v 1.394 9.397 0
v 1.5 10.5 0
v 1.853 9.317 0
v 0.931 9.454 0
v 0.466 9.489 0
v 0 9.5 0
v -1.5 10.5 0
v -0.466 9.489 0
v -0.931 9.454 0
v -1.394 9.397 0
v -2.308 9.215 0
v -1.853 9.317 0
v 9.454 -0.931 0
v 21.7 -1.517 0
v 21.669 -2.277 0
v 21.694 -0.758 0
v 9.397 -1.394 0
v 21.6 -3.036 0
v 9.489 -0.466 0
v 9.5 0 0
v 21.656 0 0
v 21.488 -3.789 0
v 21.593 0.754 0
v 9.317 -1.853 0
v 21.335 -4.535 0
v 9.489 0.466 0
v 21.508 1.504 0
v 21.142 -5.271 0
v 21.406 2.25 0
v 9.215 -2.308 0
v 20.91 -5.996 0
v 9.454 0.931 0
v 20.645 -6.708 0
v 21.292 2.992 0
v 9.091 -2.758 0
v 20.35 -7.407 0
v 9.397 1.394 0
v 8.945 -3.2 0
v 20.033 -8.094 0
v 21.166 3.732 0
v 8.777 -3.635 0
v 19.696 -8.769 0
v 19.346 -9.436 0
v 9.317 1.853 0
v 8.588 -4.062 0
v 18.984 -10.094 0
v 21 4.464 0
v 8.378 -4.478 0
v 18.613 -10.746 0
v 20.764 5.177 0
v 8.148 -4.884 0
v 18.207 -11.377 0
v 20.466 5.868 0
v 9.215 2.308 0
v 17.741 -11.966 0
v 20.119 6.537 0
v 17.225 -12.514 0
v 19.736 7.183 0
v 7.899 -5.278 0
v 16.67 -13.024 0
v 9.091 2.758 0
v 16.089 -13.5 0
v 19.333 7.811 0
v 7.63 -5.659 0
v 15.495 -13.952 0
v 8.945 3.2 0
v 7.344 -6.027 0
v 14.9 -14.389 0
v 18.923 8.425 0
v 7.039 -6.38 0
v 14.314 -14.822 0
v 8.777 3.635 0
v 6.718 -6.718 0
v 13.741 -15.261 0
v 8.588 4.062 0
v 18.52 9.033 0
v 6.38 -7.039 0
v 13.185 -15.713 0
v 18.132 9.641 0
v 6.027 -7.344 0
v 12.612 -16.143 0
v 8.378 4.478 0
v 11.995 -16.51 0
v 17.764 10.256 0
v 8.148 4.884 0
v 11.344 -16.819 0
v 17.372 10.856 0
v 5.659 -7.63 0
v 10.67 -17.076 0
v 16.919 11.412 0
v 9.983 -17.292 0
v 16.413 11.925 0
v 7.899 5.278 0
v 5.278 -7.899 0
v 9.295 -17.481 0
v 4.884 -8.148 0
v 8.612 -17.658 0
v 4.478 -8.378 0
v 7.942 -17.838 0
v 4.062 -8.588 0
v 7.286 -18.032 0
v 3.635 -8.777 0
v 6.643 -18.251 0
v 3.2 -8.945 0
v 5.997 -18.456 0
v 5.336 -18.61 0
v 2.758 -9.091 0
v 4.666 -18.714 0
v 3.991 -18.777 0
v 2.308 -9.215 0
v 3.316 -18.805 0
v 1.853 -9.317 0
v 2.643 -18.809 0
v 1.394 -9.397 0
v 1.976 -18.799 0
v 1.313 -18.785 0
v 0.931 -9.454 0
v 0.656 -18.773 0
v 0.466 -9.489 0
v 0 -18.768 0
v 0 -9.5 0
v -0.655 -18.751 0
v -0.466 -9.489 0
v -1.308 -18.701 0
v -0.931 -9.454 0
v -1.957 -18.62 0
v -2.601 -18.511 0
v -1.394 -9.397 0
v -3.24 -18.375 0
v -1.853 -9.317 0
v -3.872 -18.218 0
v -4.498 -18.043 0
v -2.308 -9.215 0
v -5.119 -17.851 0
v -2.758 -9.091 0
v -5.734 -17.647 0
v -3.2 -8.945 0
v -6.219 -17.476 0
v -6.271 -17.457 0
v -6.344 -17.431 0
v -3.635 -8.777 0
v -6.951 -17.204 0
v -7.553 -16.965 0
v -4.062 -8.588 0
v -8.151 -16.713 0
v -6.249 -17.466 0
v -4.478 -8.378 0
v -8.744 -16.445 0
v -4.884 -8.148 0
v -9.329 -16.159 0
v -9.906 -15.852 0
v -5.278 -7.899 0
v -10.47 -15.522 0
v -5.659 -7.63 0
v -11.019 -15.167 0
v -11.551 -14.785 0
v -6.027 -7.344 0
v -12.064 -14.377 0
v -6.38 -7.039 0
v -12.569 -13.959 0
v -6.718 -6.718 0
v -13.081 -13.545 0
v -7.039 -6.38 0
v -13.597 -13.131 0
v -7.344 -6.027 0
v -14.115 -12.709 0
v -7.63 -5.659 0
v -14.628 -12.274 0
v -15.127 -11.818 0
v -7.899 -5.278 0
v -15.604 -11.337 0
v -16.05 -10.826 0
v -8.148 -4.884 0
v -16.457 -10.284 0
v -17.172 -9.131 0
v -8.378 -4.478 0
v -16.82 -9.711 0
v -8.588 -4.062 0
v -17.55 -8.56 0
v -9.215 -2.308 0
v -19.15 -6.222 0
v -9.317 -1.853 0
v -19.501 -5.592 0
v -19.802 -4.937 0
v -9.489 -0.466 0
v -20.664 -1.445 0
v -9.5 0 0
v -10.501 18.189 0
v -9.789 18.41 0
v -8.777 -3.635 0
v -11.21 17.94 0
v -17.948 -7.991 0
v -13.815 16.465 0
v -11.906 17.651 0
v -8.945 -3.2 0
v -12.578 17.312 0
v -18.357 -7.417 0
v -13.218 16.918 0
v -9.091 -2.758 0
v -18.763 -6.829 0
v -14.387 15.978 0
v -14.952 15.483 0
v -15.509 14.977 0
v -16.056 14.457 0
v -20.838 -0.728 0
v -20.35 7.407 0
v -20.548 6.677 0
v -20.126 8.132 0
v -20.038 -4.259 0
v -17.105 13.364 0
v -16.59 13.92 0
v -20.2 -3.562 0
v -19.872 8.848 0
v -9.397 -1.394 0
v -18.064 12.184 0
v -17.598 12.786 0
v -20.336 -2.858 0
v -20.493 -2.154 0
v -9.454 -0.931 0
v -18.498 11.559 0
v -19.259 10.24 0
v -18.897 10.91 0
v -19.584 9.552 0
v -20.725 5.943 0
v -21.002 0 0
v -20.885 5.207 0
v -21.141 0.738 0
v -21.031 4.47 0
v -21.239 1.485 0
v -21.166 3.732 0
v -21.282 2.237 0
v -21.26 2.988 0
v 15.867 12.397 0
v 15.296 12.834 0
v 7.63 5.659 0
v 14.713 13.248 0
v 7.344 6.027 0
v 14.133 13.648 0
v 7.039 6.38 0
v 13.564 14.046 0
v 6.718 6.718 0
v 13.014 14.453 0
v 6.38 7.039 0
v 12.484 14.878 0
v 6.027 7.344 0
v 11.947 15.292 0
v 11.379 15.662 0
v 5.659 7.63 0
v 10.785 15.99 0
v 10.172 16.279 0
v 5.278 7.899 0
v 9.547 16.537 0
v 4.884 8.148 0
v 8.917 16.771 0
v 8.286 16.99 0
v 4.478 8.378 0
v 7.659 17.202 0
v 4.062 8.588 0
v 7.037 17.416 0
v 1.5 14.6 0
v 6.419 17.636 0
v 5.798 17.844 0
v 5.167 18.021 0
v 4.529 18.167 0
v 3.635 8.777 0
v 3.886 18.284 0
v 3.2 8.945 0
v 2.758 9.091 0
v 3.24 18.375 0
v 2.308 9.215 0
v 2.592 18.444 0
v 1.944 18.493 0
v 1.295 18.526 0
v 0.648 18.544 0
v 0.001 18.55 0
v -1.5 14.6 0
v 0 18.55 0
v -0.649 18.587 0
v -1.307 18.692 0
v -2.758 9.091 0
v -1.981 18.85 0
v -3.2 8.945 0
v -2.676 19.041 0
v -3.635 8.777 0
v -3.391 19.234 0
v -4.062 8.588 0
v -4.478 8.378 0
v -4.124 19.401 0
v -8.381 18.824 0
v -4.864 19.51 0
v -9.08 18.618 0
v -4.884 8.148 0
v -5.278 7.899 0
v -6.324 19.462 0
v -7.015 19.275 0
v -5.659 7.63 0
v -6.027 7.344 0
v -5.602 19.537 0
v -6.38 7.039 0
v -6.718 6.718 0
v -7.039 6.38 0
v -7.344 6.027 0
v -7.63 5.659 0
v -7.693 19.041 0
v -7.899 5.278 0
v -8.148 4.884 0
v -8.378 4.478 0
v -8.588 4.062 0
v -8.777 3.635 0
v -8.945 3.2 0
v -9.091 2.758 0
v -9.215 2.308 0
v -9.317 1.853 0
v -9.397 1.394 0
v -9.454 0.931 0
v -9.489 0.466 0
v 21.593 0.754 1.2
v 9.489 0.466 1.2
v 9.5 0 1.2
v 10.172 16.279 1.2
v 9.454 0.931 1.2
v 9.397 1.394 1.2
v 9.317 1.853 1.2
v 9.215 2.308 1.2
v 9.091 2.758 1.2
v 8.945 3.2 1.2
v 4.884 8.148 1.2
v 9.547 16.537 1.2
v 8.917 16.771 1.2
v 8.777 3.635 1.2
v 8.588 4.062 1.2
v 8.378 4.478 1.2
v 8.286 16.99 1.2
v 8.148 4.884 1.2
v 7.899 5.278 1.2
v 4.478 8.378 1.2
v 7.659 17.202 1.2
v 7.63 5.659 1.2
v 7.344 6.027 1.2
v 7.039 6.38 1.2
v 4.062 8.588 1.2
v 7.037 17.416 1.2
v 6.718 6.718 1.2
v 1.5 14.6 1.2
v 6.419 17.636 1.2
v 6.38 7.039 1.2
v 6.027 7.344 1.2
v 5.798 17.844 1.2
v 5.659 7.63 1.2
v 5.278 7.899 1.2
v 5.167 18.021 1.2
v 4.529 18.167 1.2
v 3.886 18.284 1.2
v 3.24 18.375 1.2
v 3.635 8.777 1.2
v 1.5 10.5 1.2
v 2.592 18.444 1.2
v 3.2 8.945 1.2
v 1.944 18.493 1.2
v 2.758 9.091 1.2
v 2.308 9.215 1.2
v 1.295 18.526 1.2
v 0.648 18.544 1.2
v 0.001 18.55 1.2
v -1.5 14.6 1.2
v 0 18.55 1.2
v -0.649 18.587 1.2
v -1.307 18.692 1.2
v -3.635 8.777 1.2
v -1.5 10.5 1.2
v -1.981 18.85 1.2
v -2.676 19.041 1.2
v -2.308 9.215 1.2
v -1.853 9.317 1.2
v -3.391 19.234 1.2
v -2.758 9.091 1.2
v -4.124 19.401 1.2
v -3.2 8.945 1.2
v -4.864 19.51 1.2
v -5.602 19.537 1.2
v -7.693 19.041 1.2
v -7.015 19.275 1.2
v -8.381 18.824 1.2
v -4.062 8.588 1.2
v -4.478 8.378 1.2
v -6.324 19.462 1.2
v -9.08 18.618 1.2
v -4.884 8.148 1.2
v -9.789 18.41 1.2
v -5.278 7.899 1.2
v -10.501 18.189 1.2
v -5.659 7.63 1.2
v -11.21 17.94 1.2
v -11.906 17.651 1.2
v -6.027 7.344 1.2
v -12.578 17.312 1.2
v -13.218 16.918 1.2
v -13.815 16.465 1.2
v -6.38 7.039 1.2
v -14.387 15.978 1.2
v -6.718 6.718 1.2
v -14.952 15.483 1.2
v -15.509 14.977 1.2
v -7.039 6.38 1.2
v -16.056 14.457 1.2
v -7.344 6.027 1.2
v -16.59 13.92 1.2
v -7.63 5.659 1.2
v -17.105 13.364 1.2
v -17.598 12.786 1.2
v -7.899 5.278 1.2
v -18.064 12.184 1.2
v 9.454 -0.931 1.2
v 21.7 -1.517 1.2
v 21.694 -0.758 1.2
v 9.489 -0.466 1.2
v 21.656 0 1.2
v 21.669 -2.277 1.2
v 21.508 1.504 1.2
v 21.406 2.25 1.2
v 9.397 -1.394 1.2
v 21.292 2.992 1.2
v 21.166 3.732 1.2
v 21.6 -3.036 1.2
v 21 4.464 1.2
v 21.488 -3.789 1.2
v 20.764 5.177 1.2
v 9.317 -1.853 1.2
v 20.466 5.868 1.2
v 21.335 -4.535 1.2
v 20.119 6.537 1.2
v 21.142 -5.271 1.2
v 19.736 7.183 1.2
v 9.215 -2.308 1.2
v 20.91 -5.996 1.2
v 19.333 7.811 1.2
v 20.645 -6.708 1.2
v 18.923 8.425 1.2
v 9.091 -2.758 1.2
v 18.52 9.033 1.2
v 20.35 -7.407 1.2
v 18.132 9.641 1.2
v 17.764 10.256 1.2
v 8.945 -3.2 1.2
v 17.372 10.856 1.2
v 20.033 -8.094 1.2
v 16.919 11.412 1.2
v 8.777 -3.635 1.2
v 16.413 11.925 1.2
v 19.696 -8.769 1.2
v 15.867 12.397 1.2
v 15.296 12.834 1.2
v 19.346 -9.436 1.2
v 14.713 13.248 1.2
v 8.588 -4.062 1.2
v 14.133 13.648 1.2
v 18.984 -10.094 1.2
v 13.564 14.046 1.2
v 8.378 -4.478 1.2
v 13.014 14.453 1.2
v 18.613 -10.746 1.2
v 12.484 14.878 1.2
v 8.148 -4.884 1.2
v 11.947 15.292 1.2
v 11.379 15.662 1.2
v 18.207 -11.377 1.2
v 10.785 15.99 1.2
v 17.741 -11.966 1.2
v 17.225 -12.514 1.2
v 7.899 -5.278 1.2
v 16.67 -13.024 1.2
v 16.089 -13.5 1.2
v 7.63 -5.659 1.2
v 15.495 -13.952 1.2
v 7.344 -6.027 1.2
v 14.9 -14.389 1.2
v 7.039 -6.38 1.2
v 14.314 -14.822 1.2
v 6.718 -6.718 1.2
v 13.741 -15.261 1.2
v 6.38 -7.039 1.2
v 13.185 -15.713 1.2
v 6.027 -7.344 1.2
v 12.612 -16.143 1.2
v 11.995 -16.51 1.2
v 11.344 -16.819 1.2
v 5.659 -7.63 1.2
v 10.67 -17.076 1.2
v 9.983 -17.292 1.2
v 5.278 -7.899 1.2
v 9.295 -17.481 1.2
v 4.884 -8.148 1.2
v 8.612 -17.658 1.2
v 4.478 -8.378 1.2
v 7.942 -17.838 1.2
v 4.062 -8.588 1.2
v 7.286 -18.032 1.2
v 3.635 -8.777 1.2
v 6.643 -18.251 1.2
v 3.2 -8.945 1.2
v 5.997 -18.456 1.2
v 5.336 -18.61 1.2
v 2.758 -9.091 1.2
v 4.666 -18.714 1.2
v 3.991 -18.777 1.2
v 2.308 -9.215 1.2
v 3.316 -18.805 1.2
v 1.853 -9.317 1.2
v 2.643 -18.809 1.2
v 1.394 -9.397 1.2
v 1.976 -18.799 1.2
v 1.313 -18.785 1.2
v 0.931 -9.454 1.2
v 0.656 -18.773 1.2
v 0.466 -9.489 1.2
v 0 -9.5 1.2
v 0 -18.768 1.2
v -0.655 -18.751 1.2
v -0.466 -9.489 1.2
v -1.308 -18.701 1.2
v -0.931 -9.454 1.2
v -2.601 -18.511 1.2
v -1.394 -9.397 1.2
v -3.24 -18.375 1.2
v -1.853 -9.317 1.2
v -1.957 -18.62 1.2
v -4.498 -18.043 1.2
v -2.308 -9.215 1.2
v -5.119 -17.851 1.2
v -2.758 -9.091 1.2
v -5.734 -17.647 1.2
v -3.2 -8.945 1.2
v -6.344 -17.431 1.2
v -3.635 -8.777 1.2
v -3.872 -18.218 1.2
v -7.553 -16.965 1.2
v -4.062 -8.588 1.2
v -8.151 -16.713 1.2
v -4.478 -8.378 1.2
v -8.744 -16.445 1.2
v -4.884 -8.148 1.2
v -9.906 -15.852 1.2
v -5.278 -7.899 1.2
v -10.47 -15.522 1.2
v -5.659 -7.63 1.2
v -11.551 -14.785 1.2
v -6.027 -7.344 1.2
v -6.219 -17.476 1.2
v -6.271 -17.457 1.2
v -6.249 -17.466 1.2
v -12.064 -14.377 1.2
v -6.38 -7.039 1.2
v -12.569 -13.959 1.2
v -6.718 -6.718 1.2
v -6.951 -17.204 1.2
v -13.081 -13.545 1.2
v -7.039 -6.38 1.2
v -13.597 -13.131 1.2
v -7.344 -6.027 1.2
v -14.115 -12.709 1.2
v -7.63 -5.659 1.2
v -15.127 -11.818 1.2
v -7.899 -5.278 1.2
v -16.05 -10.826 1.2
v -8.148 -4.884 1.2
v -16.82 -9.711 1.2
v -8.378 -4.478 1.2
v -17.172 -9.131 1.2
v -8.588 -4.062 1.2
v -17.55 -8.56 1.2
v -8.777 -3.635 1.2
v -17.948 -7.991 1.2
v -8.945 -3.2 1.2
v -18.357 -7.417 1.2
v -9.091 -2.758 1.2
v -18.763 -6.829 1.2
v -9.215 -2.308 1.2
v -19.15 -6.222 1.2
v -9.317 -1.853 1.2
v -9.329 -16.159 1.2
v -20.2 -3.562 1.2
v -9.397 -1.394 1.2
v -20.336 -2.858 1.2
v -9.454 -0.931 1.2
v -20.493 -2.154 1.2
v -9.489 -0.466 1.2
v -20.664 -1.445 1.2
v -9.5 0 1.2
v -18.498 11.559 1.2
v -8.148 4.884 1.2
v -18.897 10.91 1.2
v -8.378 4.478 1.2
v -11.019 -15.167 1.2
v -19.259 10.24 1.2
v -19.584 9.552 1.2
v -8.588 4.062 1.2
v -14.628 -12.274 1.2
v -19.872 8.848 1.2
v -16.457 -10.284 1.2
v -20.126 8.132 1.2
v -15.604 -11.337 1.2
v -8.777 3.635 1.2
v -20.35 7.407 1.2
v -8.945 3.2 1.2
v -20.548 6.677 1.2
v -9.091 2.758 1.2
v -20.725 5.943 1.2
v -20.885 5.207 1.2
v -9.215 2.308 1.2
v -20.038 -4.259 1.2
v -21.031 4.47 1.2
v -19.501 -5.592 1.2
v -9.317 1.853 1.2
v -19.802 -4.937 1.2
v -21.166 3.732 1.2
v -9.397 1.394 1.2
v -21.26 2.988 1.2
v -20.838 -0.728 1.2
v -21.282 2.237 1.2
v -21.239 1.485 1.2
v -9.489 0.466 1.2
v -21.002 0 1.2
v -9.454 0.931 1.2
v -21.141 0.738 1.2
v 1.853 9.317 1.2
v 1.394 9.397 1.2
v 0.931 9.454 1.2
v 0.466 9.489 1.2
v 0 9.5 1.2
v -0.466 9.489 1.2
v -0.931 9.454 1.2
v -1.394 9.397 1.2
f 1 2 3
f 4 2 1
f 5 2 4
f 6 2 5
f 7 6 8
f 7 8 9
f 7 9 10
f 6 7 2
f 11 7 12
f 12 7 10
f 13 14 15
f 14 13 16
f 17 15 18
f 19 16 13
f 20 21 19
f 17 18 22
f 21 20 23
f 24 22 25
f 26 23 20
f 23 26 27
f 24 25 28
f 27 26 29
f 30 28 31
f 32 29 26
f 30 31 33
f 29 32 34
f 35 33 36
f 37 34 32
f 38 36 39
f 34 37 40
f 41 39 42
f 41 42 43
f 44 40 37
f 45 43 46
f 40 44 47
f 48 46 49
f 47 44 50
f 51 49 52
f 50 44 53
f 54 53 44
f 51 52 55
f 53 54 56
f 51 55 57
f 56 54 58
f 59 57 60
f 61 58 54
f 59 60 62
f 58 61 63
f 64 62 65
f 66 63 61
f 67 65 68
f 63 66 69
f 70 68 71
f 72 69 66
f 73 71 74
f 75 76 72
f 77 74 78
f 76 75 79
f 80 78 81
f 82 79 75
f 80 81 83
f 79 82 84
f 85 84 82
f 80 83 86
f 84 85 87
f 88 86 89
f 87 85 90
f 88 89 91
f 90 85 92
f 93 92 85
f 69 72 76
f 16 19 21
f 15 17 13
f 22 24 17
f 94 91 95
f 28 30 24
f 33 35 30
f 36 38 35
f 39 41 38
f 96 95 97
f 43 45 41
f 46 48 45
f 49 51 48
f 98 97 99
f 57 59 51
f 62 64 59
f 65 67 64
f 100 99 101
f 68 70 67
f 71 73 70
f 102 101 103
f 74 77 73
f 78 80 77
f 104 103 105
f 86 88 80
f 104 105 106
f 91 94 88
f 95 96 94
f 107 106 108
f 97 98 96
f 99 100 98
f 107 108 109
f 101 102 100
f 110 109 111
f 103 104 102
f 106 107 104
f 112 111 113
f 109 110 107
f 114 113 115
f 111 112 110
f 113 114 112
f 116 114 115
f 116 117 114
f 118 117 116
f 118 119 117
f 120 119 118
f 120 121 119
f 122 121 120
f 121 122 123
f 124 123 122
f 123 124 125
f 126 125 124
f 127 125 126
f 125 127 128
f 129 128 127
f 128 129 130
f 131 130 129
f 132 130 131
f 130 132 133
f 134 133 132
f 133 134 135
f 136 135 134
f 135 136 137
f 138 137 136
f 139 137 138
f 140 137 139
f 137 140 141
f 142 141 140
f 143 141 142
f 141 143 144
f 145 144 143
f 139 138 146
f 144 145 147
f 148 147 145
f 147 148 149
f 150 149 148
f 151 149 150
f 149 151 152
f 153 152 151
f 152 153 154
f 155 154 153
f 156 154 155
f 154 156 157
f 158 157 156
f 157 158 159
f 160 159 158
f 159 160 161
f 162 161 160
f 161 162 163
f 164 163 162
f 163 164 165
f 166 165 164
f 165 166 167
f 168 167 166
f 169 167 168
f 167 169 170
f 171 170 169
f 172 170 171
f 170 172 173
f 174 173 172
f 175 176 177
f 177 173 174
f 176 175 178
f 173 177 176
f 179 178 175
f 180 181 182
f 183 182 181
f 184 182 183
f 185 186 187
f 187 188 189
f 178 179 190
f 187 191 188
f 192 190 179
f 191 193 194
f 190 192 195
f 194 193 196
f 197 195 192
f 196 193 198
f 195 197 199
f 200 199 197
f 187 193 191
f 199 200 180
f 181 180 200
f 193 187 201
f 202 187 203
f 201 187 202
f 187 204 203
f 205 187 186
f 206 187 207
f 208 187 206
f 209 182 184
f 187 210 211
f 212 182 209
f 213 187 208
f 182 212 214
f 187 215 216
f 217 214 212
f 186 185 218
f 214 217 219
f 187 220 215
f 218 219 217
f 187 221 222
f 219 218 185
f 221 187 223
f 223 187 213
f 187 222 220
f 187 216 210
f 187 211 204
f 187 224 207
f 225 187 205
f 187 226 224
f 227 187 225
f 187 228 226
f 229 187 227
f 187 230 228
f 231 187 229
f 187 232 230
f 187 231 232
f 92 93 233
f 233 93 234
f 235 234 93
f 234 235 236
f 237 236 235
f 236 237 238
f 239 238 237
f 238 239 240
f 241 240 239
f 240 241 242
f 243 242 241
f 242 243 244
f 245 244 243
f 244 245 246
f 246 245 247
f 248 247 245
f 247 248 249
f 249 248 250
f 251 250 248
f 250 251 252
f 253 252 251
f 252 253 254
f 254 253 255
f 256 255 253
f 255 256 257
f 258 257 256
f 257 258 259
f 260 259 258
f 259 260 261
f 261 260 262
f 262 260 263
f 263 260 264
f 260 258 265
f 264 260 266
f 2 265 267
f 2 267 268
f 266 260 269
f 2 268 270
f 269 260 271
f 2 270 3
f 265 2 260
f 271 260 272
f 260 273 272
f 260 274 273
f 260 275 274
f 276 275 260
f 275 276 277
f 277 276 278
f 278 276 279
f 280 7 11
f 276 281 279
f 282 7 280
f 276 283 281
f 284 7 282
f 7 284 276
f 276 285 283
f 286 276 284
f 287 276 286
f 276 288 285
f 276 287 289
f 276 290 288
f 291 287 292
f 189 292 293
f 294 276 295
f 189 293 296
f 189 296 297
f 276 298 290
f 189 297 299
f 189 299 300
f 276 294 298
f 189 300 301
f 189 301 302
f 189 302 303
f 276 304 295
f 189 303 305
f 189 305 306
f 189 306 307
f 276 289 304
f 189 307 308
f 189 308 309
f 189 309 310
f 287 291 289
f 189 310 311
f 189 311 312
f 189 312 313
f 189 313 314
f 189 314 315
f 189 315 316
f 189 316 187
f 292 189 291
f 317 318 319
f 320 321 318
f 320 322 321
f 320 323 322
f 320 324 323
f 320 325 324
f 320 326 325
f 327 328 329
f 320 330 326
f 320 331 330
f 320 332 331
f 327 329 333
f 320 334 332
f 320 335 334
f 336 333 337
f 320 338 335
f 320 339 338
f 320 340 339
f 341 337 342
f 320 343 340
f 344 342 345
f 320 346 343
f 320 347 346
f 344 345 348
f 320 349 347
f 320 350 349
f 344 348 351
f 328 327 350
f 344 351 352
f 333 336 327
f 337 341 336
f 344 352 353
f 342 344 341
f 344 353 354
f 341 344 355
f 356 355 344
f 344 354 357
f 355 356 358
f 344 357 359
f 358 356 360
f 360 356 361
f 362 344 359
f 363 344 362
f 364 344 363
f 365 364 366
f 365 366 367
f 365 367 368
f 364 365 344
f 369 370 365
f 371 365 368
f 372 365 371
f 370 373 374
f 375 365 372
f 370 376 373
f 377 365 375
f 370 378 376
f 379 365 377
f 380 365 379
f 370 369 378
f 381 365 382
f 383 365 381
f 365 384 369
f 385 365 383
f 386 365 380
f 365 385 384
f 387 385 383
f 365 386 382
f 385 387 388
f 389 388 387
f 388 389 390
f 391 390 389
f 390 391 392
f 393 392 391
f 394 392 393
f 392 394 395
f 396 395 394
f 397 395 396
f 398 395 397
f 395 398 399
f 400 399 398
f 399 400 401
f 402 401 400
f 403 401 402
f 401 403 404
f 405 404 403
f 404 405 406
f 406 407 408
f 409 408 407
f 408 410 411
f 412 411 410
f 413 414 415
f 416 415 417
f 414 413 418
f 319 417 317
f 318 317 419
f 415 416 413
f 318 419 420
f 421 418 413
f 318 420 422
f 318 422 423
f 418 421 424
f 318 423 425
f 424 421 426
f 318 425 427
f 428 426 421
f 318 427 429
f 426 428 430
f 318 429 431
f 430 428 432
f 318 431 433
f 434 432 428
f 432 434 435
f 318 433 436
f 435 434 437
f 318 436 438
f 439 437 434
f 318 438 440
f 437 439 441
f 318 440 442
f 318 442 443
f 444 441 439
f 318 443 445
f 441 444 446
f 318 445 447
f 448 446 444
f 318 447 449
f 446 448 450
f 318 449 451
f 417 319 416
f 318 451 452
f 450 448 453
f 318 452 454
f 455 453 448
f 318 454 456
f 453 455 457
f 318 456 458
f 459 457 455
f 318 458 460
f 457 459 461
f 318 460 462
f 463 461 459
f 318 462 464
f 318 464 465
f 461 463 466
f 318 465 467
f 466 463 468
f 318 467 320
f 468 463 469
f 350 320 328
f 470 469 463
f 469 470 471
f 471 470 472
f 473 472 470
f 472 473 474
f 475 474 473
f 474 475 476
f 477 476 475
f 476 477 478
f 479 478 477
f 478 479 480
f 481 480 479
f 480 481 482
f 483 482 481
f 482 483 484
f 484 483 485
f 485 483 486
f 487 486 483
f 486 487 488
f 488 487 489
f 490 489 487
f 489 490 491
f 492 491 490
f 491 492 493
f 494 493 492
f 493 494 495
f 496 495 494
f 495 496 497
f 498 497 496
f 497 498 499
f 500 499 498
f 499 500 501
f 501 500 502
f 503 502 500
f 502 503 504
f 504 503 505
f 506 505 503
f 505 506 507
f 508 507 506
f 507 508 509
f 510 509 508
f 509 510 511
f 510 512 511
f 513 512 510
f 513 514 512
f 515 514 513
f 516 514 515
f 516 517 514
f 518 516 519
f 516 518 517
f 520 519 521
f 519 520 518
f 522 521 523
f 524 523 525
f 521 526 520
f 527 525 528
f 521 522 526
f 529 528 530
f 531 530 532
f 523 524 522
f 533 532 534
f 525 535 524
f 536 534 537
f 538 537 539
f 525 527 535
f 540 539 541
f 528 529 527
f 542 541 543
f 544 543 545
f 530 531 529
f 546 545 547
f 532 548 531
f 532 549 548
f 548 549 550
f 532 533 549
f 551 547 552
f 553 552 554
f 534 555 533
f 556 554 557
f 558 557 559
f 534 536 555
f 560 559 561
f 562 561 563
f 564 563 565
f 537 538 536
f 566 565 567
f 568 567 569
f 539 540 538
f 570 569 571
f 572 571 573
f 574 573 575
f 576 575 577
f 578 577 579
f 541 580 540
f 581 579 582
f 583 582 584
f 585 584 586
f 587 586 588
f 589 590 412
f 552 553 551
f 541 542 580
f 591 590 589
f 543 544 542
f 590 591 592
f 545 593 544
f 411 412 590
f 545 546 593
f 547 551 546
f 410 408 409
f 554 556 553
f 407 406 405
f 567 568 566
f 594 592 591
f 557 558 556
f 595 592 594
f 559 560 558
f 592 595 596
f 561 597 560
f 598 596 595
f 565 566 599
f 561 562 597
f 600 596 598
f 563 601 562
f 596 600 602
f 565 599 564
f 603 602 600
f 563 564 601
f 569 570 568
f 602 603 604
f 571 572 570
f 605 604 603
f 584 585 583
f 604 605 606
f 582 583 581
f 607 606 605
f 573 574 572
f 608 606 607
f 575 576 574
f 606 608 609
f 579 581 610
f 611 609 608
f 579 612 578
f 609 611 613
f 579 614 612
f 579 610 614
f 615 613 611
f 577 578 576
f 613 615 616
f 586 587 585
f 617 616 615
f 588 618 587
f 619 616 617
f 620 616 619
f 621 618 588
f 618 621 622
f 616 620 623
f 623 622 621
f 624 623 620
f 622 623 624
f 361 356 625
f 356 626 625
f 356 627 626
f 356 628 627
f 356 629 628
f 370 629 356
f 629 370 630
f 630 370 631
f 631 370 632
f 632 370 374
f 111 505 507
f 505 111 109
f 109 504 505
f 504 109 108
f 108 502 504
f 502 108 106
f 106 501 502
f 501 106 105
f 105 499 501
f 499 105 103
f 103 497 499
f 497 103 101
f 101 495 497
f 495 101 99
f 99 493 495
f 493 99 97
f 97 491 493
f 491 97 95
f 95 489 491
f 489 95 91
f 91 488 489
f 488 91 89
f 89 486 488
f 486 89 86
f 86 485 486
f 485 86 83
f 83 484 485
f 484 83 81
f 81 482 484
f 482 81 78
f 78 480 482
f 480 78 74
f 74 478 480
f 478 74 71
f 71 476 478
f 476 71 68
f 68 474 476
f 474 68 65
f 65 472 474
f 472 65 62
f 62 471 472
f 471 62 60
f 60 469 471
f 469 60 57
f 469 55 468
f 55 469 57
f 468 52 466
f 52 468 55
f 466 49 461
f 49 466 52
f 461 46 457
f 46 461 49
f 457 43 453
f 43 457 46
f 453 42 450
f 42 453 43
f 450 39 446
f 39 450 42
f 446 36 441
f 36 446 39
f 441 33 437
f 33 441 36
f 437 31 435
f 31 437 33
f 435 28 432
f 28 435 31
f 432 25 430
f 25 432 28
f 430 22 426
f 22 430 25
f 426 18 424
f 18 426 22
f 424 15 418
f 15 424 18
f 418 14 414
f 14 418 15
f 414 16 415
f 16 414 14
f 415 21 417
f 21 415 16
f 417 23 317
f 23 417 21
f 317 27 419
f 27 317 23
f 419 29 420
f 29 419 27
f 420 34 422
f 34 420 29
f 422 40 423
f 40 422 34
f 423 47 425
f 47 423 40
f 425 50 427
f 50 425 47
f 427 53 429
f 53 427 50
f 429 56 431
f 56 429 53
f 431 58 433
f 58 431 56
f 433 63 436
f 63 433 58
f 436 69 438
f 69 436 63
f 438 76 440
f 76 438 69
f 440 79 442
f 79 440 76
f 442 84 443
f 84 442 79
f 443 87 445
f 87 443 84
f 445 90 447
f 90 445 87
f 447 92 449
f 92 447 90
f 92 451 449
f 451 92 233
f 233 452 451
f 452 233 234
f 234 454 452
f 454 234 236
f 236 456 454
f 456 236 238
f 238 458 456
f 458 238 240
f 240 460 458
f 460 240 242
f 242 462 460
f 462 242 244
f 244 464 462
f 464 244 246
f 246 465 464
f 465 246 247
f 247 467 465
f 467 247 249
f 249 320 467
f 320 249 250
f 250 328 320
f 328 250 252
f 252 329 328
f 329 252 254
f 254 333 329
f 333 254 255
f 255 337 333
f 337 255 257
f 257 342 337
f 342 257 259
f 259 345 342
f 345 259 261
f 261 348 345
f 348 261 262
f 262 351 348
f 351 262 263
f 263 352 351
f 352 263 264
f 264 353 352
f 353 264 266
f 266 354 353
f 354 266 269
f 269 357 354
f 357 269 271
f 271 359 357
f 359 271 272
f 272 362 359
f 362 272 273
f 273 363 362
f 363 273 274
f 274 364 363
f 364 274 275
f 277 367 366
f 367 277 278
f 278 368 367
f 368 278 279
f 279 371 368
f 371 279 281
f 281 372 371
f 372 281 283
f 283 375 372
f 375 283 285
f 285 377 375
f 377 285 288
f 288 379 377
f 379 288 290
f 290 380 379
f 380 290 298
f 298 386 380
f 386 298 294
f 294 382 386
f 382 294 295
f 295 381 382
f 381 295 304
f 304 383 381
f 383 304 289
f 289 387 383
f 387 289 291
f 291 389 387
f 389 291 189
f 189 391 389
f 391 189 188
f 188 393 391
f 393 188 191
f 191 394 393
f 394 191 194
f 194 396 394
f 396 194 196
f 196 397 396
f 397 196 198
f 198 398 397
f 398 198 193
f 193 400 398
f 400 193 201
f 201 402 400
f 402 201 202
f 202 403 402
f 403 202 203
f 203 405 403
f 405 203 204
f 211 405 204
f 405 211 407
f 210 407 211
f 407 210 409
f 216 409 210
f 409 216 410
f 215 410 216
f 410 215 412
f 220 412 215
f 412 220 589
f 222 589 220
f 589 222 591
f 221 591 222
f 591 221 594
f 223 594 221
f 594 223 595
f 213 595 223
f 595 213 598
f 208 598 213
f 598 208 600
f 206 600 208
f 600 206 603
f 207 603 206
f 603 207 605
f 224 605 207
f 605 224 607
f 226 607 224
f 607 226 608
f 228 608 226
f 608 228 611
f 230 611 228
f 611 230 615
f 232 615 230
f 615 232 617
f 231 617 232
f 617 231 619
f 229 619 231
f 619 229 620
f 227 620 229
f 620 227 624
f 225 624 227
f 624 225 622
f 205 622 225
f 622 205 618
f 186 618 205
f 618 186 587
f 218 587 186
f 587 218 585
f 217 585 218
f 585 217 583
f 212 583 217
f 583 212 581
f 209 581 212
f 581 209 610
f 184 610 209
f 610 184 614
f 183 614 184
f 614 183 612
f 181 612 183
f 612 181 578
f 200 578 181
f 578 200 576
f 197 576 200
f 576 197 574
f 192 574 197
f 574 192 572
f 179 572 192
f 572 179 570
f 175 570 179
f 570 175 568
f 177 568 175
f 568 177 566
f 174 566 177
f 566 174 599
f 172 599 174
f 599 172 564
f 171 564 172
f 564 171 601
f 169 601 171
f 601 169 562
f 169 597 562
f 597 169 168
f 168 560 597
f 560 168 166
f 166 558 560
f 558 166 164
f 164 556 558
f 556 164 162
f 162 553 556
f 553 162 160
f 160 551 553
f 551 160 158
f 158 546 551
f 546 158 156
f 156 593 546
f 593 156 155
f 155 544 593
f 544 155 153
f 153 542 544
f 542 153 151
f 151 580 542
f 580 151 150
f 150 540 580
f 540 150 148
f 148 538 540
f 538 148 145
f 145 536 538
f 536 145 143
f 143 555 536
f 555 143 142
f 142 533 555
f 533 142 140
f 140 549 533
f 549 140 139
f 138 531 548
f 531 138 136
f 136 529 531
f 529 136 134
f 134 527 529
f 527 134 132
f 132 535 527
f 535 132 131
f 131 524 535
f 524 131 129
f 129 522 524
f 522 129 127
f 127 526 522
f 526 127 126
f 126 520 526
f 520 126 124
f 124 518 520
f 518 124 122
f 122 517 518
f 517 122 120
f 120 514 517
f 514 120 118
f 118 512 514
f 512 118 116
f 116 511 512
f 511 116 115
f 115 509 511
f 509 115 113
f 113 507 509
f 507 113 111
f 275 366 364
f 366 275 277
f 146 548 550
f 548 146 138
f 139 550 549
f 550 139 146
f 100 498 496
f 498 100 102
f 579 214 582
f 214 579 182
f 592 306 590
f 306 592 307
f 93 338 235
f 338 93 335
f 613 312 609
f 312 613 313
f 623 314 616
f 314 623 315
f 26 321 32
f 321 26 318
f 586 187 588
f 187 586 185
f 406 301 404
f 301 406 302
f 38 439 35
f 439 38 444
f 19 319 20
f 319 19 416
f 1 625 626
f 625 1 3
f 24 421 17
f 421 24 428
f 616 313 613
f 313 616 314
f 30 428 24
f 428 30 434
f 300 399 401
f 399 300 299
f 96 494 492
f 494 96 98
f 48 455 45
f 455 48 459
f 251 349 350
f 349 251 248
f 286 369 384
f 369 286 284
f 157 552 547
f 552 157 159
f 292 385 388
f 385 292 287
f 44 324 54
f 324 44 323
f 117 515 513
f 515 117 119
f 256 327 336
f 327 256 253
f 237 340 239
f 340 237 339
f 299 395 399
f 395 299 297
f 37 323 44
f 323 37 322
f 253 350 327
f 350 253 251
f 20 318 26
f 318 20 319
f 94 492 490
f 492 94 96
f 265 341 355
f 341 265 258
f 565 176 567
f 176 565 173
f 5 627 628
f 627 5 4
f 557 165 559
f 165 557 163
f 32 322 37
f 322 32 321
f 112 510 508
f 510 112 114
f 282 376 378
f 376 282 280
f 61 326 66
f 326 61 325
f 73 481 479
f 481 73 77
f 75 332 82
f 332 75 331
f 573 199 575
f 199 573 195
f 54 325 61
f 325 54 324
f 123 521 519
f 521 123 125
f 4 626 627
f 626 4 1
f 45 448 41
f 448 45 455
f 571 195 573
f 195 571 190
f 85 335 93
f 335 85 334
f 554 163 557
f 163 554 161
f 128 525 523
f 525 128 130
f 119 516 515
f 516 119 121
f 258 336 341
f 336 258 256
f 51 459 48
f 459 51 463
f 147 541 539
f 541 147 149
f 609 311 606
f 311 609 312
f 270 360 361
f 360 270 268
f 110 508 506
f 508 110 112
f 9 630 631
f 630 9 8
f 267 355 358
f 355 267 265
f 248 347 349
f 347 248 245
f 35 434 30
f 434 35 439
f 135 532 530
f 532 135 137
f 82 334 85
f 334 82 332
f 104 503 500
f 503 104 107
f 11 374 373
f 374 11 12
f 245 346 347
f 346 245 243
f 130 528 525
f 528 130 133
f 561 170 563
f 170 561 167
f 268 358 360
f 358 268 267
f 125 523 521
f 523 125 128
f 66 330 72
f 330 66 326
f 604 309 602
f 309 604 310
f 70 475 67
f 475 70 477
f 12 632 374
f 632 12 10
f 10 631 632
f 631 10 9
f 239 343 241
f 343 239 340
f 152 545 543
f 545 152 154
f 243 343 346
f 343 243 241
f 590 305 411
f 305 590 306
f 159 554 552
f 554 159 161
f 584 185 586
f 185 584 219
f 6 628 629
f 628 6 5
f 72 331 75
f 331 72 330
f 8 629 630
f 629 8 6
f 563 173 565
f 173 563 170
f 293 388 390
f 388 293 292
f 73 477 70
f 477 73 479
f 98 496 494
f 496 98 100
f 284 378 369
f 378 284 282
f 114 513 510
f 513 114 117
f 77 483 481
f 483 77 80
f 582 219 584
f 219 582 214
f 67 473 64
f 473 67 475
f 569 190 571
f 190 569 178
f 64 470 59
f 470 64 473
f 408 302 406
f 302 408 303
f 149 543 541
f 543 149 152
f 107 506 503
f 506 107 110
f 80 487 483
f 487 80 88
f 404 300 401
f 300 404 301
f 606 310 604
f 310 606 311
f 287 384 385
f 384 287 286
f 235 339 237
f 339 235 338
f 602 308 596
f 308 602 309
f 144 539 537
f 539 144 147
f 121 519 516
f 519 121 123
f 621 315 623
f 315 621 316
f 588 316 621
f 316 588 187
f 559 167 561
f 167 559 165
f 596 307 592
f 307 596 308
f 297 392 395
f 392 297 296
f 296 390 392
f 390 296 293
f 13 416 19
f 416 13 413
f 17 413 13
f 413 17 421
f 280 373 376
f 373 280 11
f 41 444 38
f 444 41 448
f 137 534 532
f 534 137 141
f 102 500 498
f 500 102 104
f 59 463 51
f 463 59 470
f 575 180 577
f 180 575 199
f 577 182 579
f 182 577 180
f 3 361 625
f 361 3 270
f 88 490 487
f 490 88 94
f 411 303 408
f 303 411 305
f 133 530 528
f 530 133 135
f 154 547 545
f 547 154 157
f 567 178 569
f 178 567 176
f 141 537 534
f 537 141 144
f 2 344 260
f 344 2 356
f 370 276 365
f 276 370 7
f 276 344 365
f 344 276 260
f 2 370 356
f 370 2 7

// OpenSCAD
/*
  Elna Supermatic cam 04
  Name: Long scallop
  Status: candidate

  Generated from measured parametric base v2.
  Surface mode: smooth
*/

include <_elna_measured_common.scad>;

profile_points = [
        [0.0000, 18.5500],
        [0.6476, 18.5440],
        [1.2954, 18.5256],
        [1.9437, 18.4931],
        [2.5921, 18.4441],
        [3.2401, 18.3755],
        [3.8864, 18.2842],
        [4.5295, 18.1669],
        [5.1674, 18.0209],
        [5.7980, 17.8444],
        [6.4190, 17.6362],
        [7.0366, 17.4162],
        [7.6590, 17.2025],
        [8.2864, 16.9897],
        [8.9171, 16.7707],
        [9.5475, 16.5368],
        [10.1724, 16.2792],
        [10.7853, 15.9898],
        [11.3793, 15.6622],
        [11.9475, 15.2921],
        [12.4842, 14.8781],
        [13.0137, 14.4532],
        [13.5640, 14.0459],
        [14.1326, 13.6477],
        [14.7132, 13.2478],
        [15.2956, 12.8345],
        [15.8669, 12.3966],
        [16.4128, 11.9246],
        [16.9189, 11.4120],
        [17.3725, 10.8556],
        [17.7639, 10.2560],
        [18.1322, 9.6411],
        [18.5203, 9.0329],
        [18.9234, 8.4252],
        [19.3326, 7.8109],
        [19.7359, 7.1833],
        [20.1187, 6.5370],
        [20.4660, 5.8685],
        [20.7637, 5.1770],
        [20.9998, 4.4637],
        [21.1665, 3.7322],
        [21.2918, 2.9924],
        [21.4063, 2.2499],
        [21.5079, 1.5040],
        [21.5928, 0.7540],
        [21.6565, 0.0000],
        [21.6938, -0.7576],
        [21.6996, -1.5174],
        [21.6694, -2.2775],
        [21.5997, -3.0356],
        [21.4885, -3.7890],
        [21.3354, -4.5350],
        [21.1416, -5.2712],
        [20.9099, -5.9958],
        [20.6446, -6.7078],
        [20.3505, -7.4070],
        [20.0327, -8.0937],
        [19.6964, -8.7694],
        [19.3458, -9.4356],
        [18.9843, -10.0941],
        [18.6135, -10.7465],
        [18.2067, -11.3768],
        [17.7408, -11.9663],
        [17.2246, -12.5144],
        [16.6696, -13.0237],
        [16.0888, -13.5001],
        [15.4953, -13.9520],
        [14.9005, -14.3893],
        [14.3139, -14.8225],
        [13.7413, -15.2612],
        [13.1849, -15.7131],
        [12.6120, -16.1427],
        [11.9955, -16.5103],
        [11.3445, -16.8190],
        [10.6701, -17.0758],
        [9.9835, -17.2919],
        [9.2949, -17.4811],
        [8.6125, -17.6583],
        [7.9420, -17.8380],
        [7.2856, -18.0325],
        [6.6427, -18.2507],
        [5.9968, -18.4562],
        [5.3362, -18.6096],
        [4.6660, -18.7143],
        [3.9911, -18.7766],
        [3.3158, -18.8049],
        [2.6434, -18.8091],
        [1.9759, -18.7992],
        [1.3135, -18.7846],
        [0.6556, -18.7726],
        [0.0000, -18.7680],
        [-0.6548, -18.7512],
        [-1.3077, -18.7015],
        [-1.9571, -18.6205],
        [-2.6015, -18.5108],
        [-3.2401, -18.3755],
        [-3.8724, -18.2183],
        [-4.4985, -18.0426],
        [-5.1188, -17.8514],
        [-5.7339, -17.6472],
        [-6.3445, -17.4313],
        [-6.9510, -17.2042],
        [-7.5534, -16.9653],
        [-8.1515, -16.7130],
        [-8.7441, -16.4452],
        [-9.3295, -16.1592],
        [-9.9056, -15.8523],
        [-10.4698, -15.5221],
        [-11.0193, -15.1668],
        [-11.5515, -14.7852],
        [-12.0638, -14.3771],
        [-12.5690, -13.9592],
        [-13.0807, -13.5455],
        [-13.5975, -13.1310],
        [-14.1153, -12.7094],
        [-14.6276, -12.2740],
        [-15.1267, -11.8183],
        [-15.6037, -11.3367],
        [-16.0498, -10.8257],
        [-16.4572, -10.2836],
        [-16.8199, -9.7110],
        [-17.1722, -9.1306],
        [-17.5499, -8.5597],
        [-17.9481, -7.9910],
        [-18.3569, -7.4167],
        [-18.7628, -6.8291],
        [-19.1499, -6.2222],
        [-19.5014, -5.5919],
        [-19.8017, -4.9371],
        [-20.0377, -4.2591],
        [-20.2004, -3.5619],
        [-20.3362, -2.8581],
        [-20.4928, -2.1539],
        [-20.6637, -1.4449],
        [-20.8382, -0.7277],
        [-21.0025, -0.0000],
        [-21.1412, 0.7383],
        [-21.2389, 1.4852],
        [-21.2821, 2.2368],
        [-21.2601, 2.9879],
        [-21.1665, 3.7322],
        [-21.0312, 4.4703],
        [-20.8849, 5.2072],
        [-20.7252, 5.9429],
        [-20.5485, 6.6766],
        [-20.3505, 7.4070],
        [-20.1264, 8.1316],
        [-19.8720, 8.8476],
        [-19.5836, 9.5516],
        [-19.2589, 10.2401],
        [-18.8967, 10.9100],
        [-18.4976, 11.5586],
        [-18.0637, 12.1841],
        [-17.5982, 12.7859],
        [-17.1054, 13.3642],
        [-16.5898, 13.9205],
        [-16.0564, 14.4572],
        [-15.5093, 14.9771],
        [-14.9520, 15.4832],
        [-14.3870, 15.9784],
        [-13.8154, 16.4646],
        [-13.2176, 16.9178],
        [-12.5782, 17.3124],
        [-11.9057, 17.6509],
        [-11.2100, 17.9397],
        [-10.5013, 18.1887],
        [-9.7889, 18.4103],
        [-9.0805, 18.6178],
        [-8.3811, 18.8242],
        [-7.6929, 19.0407],
        [-7.0155, 19.2750],
        [-6.3237, 19.4624],
        [-5.6022, 19.5373],
        [-4.8645, 19.5103],
        [-4.1238, 19.4007],
        [-3.3915, 19.2343],
        [-2.6760, 19.0407],
        [-1.9813, 18.8505],
        [-1.3071, 18.6917],
        [-0.6491, 18.5867]
];

icon_points = [[-1.000,0.100], [-0.959,0.257], [-0.918,0.408], [-0.878,0.547], [-0.837,0.670], [-0.796,0.773], [-0.755,0.850], [-0.714,0.899], [-0.673,0.920], [-0.633,0.909], [-0.592,0.870], [-0.551,0.801], [-0.510,0.707], [-0.469,0.590], [-0.429,0.456], [-0.388,0.308], [-0.347,0.153], [-0.306,0.205], [-0.265,0.358], [-0.224,0.502], [-0.184,0.632], [-0.143,0.741], [-0.102,0.827], [-0.061,0.886], [-0.020,0.916], [0.020,0.916], [0.061,0.886], [0.102,0.827], [0.143,0.741], [0.184,0.632], [0.224,0.502], [0.265,0.358], [0.306,0.205], [0.347,0.153], [0.388,0.308], [0.429,0.456], [0.469,0.590], [0.510,0.707], [0.551,0.801], [0.592,0.870], [0.633,0.909], [0.673,0.920], [0.714,0.899], [0.755,0.850], [0.796,0.773], [0.837,0.670], [0.878,0.547], [0.918,0.408], [0.959,0.257], [1.000,0.100]];

elna_cam_ring(profile_points=profile_points);
